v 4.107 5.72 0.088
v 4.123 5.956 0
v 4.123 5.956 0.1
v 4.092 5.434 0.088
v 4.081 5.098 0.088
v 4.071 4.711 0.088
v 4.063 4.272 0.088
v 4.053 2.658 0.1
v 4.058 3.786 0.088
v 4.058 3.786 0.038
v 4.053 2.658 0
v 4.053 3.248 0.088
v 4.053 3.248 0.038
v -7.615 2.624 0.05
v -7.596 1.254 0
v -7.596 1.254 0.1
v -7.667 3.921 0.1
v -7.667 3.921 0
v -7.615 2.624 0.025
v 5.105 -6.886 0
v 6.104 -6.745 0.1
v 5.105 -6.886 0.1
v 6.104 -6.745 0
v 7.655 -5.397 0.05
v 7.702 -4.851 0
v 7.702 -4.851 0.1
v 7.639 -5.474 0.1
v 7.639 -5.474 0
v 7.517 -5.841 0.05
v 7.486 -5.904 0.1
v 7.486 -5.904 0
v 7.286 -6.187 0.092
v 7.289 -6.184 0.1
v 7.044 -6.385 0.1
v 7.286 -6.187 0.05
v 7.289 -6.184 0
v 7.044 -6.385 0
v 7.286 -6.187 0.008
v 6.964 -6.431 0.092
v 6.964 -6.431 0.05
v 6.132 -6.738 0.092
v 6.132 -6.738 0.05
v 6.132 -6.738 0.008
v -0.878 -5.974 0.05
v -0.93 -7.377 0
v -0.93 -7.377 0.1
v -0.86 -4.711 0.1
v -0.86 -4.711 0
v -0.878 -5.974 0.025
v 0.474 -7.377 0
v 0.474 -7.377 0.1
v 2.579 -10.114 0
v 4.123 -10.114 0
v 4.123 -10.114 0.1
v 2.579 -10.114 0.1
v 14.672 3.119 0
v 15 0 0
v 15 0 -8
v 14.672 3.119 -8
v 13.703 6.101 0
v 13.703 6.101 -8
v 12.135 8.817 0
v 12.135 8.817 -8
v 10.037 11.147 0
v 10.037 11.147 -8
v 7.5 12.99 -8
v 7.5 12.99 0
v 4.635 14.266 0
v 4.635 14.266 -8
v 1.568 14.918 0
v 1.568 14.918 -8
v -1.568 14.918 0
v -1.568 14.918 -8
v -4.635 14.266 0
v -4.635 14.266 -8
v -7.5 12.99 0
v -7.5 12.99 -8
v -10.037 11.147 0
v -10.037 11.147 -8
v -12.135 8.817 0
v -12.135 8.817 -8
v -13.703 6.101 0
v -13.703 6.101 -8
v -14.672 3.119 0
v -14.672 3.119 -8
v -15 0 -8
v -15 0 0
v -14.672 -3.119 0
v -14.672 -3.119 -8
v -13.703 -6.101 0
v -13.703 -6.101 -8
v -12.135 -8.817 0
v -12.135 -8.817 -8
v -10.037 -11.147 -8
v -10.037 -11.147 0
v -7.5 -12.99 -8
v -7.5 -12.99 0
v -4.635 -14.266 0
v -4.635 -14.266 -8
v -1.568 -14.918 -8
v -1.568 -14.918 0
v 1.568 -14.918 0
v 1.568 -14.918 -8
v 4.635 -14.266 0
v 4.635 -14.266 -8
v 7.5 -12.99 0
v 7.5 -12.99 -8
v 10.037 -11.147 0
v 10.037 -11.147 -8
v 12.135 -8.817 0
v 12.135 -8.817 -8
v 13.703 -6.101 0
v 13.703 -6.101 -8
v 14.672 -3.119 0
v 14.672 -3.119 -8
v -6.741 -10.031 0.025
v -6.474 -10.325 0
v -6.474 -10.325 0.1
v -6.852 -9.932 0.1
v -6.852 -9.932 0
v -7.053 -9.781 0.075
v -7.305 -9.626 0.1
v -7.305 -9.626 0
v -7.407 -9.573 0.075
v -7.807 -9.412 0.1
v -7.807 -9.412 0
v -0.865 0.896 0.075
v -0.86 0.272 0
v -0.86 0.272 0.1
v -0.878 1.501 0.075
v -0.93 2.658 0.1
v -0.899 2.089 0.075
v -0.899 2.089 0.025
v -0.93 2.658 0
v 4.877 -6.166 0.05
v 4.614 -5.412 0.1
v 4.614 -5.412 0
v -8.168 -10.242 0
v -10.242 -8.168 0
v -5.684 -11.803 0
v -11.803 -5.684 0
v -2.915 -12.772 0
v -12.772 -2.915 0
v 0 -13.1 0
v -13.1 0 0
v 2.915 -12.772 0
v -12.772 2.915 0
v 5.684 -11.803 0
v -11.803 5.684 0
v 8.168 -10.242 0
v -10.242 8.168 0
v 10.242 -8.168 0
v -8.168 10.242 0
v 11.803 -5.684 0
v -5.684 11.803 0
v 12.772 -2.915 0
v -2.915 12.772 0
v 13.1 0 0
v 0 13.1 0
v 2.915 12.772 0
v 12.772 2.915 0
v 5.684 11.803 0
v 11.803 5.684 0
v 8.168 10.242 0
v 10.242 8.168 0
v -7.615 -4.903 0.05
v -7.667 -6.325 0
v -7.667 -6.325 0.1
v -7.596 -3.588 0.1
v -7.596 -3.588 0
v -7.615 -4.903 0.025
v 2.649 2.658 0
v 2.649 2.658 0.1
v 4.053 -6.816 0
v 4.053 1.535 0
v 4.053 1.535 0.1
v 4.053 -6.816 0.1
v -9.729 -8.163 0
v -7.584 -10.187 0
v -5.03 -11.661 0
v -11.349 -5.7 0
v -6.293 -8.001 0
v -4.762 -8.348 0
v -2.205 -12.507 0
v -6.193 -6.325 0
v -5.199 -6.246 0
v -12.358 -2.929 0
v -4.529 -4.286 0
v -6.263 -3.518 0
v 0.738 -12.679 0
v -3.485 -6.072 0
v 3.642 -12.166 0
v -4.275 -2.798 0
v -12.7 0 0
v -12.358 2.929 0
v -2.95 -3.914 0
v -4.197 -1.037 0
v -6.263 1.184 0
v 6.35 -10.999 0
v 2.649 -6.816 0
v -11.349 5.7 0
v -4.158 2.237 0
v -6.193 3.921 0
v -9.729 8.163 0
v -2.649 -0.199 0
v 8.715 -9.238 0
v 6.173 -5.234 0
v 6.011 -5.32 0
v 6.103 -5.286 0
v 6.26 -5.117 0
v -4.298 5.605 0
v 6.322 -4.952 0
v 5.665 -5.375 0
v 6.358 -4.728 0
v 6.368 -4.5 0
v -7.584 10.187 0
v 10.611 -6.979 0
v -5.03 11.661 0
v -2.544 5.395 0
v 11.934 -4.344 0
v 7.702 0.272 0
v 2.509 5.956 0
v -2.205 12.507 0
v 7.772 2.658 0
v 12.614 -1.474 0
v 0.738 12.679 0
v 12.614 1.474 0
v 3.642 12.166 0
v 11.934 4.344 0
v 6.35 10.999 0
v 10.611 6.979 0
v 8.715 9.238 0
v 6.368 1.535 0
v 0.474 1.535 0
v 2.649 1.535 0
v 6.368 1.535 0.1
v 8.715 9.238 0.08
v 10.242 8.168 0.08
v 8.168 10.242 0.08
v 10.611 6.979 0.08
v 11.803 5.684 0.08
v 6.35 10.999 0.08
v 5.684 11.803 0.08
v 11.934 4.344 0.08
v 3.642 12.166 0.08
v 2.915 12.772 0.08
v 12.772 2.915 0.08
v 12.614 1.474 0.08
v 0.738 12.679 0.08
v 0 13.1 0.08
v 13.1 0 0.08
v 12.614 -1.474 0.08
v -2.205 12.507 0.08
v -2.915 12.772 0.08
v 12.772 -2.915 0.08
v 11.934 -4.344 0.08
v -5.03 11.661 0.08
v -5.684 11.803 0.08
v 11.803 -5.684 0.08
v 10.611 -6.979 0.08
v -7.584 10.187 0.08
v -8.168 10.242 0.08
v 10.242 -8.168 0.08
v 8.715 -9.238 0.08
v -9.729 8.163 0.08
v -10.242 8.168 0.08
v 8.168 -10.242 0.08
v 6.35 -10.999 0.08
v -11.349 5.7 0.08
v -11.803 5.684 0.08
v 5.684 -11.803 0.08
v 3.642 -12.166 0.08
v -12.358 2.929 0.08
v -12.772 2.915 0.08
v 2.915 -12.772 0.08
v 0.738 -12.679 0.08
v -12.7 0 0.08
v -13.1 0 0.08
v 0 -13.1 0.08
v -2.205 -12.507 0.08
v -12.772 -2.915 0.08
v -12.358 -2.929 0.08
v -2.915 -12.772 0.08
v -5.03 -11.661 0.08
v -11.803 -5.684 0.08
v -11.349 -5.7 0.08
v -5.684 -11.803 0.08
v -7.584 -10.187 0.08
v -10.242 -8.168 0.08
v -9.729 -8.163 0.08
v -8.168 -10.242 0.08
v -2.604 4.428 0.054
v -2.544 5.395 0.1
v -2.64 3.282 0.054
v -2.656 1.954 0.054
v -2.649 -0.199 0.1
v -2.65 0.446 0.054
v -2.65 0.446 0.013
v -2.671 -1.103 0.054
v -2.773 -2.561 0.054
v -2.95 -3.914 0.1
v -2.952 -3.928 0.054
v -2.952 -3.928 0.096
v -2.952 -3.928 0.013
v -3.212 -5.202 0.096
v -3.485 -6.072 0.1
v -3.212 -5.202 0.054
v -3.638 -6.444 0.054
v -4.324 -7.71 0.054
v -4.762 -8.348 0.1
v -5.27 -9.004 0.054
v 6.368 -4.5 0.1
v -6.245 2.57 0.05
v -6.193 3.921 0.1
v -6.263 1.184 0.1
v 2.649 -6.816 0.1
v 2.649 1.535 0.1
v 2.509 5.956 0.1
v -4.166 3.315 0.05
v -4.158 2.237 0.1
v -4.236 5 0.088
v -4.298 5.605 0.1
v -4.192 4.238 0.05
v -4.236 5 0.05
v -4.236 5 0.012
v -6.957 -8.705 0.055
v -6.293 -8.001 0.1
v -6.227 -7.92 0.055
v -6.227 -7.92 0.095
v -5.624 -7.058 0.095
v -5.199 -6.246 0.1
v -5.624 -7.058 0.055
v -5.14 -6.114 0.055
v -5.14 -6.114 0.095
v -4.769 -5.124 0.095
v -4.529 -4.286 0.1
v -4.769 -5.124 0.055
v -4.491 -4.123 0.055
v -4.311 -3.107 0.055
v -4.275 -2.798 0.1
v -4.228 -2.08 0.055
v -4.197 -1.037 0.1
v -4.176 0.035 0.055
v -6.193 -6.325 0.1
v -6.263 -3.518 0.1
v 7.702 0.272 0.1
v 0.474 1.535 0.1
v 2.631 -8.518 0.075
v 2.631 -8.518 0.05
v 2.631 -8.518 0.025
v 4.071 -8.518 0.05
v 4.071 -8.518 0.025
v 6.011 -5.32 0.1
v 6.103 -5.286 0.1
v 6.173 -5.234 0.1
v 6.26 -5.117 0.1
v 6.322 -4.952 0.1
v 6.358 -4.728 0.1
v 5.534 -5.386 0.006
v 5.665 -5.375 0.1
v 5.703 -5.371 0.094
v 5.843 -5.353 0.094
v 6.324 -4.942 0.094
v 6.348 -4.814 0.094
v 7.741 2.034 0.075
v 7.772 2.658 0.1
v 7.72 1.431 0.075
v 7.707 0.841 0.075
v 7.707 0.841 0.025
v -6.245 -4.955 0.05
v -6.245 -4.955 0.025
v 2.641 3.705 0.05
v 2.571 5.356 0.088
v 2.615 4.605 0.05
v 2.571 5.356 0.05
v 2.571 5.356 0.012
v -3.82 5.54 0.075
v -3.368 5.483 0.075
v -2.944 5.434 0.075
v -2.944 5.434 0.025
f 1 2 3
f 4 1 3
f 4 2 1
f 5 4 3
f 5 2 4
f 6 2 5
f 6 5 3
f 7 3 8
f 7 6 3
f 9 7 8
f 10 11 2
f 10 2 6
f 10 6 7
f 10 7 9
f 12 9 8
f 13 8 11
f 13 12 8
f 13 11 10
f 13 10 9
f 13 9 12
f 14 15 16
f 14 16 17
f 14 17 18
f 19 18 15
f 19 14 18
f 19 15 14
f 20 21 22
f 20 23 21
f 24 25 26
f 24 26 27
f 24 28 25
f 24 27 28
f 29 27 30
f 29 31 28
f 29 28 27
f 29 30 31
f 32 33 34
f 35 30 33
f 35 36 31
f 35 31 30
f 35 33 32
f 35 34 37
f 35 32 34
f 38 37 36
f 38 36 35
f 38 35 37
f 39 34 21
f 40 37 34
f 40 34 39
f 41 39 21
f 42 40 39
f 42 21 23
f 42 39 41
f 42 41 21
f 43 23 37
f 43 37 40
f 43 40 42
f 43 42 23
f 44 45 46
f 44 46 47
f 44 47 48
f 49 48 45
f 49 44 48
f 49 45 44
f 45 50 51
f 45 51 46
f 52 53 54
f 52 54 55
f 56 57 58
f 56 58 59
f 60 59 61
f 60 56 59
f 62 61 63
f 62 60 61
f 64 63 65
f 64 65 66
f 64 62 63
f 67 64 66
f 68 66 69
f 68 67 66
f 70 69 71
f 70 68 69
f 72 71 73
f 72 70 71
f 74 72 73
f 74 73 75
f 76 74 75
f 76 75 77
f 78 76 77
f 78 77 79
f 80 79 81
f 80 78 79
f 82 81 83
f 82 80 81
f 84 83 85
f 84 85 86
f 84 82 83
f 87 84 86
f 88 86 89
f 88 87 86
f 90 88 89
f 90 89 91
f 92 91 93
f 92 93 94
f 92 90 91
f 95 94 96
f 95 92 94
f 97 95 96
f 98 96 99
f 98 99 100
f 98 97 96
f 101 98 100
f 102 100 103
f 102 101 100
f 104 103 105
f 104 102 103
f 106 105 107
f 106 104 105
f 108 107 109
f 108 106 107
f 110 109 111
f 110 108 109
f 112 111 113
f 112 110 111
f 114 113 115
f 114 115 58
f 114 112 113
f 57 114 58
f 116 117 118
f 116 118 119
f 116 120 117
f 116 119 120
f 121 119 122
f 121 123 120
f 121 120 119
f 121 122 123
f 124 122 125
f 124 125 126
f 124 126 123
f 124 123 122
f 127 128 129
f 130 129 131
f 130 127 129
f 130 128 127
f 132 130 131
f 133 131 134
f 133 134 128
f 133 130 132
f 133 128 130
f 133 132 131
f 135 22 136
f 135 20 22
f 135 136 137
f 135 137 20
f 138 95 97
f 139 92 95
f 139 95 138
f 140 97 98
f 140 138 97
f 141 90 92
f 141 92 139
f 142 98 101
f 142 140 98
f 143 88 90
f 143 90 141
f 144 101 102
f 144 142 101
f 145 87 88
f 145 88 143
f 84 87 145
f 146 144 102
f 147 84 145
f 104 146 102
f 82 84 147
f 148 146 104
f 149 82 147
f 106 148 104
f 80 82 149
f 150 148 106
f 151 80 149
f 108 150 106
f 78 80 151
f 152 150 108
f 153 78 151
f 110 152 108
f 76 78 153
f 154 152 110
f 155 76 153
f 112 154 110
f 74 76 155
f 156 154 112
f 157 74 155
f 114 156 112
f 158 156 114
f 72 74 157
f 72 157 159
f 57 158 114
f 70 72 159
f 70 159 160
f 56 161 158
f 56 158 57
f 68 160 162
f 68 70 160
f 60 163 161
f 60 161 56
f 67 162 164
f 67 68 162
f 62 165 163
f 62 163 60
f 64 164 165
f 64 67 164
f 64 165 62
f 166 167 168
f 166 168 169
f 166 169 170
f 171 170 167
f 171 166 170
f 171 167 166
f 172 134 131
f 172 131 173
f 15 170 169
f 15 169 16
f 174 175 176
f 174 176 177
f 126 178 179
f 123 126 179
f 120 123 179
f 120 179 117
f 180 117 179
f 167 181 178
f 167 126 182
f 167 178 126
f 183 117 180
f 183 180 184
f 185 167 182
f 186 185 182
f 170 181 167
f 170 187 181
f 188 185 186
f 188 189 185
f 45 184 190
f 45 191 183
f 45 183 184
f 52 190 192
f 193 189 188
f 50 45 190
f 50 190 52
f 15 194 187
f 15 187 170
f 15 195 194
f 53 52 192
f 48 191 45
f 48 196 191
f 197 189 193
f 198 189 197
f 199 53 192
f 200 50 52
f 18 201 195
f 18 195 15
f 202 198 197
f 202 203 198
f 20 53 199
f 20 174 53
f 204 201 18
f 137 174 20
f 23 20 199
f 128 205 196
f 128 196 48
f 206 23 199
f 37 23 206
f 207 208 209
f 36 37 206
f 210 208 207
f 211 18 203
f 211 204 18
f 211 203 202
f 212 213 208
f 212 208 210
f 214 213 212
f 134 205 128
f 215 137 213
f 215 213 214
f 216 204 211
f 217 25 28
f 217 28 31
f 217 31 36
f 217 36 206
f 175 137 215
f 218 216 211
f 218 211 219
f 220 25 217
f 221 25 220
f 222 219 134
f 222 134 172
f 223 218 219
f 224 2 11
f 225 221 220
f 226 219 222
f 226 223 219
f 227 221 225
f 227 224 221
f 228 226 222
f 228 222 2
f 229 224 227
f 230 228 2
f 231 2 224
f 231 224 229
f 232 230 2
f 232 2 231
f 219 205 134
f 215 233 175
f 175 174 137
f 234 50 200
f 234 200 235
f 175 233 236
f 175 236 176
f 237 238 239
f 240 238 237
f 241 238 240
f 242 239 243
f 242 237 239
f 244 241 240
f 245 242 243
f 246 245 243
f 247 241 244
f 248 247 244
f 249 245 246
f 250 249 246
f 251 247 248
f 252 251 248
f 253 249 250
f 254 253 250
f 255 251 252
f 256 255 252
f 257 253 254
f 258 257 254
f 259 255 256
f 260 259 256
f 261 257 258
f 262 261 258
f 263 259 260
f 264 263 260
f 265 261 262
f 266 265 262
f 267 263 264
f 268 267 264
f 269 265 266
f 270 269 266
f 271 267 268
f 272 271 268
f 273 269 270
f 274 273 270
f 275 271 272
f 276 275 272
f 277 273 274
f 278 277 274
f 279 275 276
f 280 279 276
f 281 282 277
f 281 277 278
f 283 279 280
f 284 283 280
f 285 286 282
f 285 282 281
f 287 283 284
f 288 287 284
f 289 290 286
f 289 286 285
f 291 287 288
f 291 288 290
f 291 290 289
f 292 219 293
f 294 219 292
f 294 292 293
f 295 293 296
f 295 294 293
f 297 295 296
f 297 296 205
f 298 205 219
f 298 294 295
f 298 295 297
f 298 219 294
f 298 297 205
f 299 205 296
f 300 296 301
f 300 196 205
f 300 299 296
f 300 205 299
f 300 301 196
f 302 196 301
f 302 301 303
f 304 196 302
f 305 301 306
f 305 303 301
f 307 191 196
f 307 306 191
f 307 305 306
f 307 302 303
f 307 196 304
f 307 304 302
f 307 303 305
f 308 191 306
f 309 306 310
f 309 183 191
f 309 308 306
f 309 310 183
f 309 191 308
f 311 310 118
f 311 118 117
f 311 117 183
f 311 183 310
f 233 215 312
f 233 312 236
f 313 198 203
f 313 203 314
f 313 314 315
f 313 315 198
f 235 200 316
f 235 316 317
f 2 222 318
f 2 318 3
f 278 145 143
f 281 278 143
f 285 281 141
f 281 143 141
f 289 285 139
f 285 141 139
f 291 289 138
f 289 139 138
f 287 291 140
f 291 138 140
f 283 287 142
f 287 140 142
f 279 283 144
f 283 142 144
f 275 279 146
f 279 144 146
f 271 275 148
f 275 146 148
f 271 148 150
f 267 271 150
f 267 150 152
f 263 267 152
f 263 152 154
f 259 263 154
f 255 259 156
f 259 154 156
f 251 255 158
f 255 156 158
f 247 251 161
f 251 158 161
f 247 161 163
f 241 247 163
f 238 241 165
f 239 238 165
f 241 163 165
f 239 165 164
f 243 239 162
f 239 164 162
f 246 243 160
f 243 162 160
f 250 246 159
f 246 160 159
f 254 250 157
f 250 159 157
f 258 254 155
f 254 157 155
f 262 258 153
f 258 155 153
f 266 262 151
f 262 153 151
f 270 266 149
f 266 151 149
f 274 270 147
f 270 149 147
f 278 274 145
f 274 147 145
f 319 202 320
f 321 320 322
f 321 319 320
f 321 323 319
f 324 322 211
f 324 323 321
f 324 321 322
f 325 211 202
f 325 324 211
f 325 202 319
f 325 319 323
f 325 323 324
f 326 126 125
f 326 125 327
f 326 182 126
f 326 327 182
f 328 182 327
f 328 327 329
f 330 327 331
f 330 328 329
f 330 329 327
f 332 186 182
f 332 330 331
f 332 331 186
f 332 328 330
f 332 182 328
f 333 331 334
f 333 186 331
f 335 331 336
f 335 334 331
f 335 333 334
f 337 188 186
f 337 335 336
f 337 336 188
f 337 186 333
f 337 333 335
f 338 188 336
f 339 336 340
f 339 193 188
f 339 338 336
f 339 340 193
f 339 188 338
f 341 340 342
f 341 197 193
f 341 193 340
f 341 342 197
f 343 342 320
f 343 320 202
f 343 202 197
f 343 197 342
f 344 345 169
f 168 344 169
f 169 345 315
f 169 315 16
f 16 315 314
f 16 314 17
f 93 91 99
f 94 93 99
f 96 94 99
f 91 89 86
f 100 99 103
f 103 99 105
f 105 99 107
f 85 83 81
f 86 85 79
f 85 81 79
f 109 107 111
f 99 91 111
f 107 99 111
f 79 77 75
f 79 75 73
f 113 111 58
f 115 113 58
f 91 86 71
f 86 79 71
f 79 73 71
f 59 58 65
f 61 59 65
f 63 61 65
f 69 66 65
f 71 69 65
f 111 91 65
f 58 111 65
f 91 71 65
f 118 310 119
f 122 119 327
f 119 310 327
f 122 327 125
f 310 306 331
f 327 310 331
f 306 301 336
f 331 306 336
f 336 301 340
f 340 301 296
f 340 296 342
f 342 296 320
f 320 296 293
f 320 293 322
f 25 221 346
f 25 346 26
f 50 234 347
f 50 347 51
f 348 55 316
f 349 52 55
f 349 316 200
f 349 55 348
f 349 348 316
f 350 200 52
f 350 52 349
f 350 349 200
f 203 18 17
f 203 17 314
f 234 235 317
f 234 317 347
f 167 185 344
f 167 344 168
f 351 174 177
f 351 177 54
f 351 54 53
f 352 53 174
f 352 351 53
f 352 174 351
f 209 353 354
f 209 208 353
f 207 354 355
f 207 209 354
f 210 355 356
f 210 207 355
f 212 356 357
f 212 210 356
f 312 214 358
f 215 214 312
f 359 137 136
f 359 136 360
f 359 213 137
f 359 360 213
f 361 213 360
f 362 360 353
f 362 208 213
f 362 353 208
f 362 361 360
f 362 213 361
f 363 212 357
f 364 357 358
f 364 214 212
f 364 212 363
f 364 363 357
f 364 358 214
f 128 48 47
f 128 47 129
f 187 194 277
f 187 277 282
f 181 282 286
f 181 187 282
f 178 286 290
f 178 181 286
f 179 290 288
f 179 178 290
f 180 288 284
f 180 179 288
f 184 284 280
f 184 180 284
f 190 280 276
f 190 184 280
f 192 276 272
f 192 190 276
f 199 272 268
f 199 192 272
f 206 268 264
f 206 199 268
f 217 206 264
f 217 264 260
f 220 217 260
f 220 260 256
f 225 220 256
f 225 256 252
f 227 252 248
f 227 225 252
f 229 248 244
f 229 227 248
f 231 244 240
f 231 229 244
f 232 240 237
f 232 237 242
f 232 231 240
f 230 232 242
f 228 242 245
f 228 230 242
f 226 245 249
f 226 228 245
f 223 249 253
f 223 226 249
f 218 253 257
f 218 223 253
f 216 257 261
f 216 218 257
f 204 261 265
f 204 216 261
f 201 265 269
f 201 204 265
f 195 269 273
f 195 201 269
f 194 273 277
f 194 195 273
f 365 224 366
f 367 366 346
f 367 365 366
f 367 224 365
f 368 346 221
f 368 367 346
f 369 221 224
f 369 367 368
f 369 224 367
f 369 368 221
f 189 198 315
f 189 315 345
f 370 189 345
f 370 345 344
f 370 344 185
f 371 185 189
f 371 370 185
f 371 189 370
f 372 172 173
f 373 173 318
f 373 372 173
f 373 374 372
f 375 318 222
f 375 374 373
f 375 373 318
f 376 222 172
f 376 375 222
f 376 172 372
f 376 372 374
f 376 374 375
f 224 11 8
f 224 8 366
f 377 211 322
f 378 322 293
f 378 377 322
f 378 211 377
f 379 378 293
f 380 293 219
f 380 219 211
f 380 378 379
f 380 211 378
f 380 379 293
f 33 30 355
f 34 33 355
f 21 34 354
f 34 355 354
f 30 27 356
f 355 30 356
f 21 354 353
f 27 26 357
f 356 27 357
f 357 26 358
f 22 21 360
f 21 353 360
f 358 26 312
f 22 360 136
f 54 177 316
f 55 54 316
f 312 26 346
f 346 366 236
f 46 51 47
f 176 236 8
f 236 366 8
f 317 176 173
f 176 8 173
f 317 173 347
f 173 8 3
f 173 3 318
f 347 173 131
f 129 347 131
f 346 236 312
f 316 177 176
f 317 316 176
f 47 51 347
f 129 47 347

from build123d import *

# Parameters (mm, degrees)
SKETCH_1_R               = 15
DIAMETER30_HEIGHT8_DEPTH = 8
CHARACTER_DEPTH          = 0.1
SKETCH_3_R               = 13.1
SKETCH_3_R_2             = 12.7
INK_RING_DEPTH           = 0.08


with BuildPart() as part:
    # 草图1 → Diameter30_Height8 (new body)
    with BuildSketch(Plane.XY):
        Circle(SKETCH_1_R)
    extrude(amount=-DIAMETER30_HEIGHT8_DEPTH)

    # 草图2 → Character_帅 (add)
    with BuildSketch(Plane.XY):
        with BuildLine():
            add(Edge.make_bspline(
                [(2.649122807, 2.657894737), (2.648277509, 2.838961546), (2.646647548, 3.188106947), (2.643949337, 3.693304246), (2.627710858, 4.161013978), (2.618261471, 4.592706352), (2.59561766, 4.986803608), (2.573364544, 5.343905172), (2.545932395, 5.6629896), (2.520624442, 5.862638482), (2.50877193, 5.956140351)],
                knots=[0, 0, 0, 0, 1.315583411, 2.536797873, 3.670260287, 4.715635349, 5.673736592, 6.537953599, 7.315277556, 8, 8, 8, 8], degree=3))
            Line((2.50877193, 5.956140351), (4.122807018, 5.956140351))
            add(Edge.make_bspline(
                [(4.122807018, 5.956140351), (4.117499898, 5.877309705), (4.105781963, 5.703254378), (4.089167905, 5.417436401), (4.081123846, 5.081109437), (4.069497803, 4.693902375), (4.062208699, 4.256354693), (4.058010495, 3.768573009), (4.051072159, 3.230576781), (4.052096052, 2.854561793), (4.052631579, 2.657894737)],
                knots=[0, 0, 0, 0, 0.574688494, 1.268892212, 2.082186167, 3.021459211, 4.086593269, 5.265055303, 6.569542337, 8, 8, 8, 8], degree=3))
            Line((4.052631579, 2.657894737), (7.771929825, 2.657894737))
            add(Edge.make_bspline(
                [(7.771929825, 2.657894737), (7.760796072, 2.449999982), (7.73890673, 2.041271737), (7.719157498, 1.435549924), (7.705407242, 0.848123825), (7.702957274, 0.461670931), (7.701754386, 0.271929825)],
                knots=[0, 0, 0, 0, 1.046485867, 2.057427233, 3.046233291, 4, 4, 4, 4], degree=3))
            Line((7.701754386, 0.271929825), (7.701754386, -4.850877193))
            add(Edge.make_bspline(
                [(7.701754386, -4.850877193), (7.700509851, -4.946341409), (7.69812364, -5.129379766), (7.659319509, -5.390999722), (7.605347303, -5.628411903), (7.522536164, -5.840237206), (7.420768732, -6.029019154), (7.289859981, -6.189160821), (7.140756422, -6.328733562), (6.901013102, -6.472408104), (6.563626246, -6.612761018), (6.121927666, -6.749793211), (5.6299881, -6.842128832), (5.284963987, -6.870952514), (5.105263158, -6.885964912)],
                knots=[0, 0, 0, 0, 0.91195479, 1.748536932, 2.524193789, 3.235017793, 3.917413987, 4.565660724, 5.204897301, 5.860042995, 7.225363373, 8.690313679, 10.276197647, 12, 12, 12, 12], degree=3))
            add(Edge.make_bspline(
                [(5.105263158, -6.885964912), (5.030622329, -6.645449861), (4.877118075, -6.150813287), (4.703323003, -5.662931781), (4.614035088, -5.412280702)],
                knots=[0, 0, 0, 0, 0.972491982, 2, 2, 2, 2], degree=3))
            add(Edge.make_bspline(
                [(4.614035088, -5.412280702), (4.703272413, -5.411616614), (4.873964221, -5.410346357), (5.116579774, -5.405384501), (5.334043291, -5.397378419), (5.526579613, -5.38822529), (5.693812444, -5.372515338), (5.836088174, -5.354724862), (5.952359909, -5.334162259), (6.04894766, -5.312443399), (6.128856661, -5.275644675), (6.193160306, -5.21721386), (6.247720931, -5.142694696), (6.295806352, -5.050517957), (6.327140956, -4.938045189), (6.350107, -4.808315534), (6.366009975, -4.660655055), (6.367588242, -4.555491891), (6.368421053, -4.5)],
                knots=[0, 0, 0, 0, 1.810479571, 3.463057961, 4.922871987, 6.225442376, 7.372781237, 8.329861336, 9.133212, 9.768407665, 10.334419243, 10.894946083, 11.510128595, 12.201898471, 12.991479159, 13.867141808, 14.874545699, 16, 16, 16, 16], degree=3))
            Line((6.368421053, -4.5), (6.368421053, 1.535087719))
            Line((6.368421053, 1.535087719), (4.052631579, 1.535087719))
            Line((4.052631579, 1.535087719), (4.052631579, -6.815789474))
            add(Edge.make_bspline(
                [(4.052631579, -6.815789474), (4.053765197, -7.103428128), (4.056001813, -7.670936452), (4.069634056, -8.508736417), (4.088763125, -9.320656714), (4.11158118, -9.852421744), (4.122807018, -10.114035088)],
                knots=[0, 0, 0, 0, 1.046194404, 2.064131589, 3.047607535, 4, 4, 4, 4], degree=3))
            Line((4.122807018, -10.114035088), (2.578947368, -10.114035088))
            add(Edge.make_bspline(
                [(2.578947368, -10.114035088), (2.590173206, -9.852421744), (2.612991261, -9.320656714), (2.63212033, -8.508736417), (2.645752573, -7.670936452), (2.647989189, -7.103428128), (2.649122807, -6.815789474)],
                knots=[0, 0, 0, 0, 0.952392465, 1.935868411, 2.953805596, 4, 4, 4, 4], degree=3))
            Line((2.649122807, -6.815789474), (2.649122807, 1.535087719))
            Line((2.649122807, 1.535087719), (0.473684211, 1.535087719))
            Line((0.473684211, 1.535087719), (0.473684211, -7.377192982))
            Line((0.473684211, -7.377192982), (-0.929824561, -7.377192982))
            add(Edge.make_bspline(
                [(-0.929824561, -7.377192982), (-0.918712527, -7.137237676), (-0.89705509, -6.669562974), (-0.877305751, -5.985025613), (-0.863382791, -5.336096743), (-0.860869477, -4.914994784), (-0.859649123, -4.710526316)],
                knots=[0, 0, 0, 0, 1.08047164, 2.105847367, 3.080283338, 4, 4, 4, 4], degree=3))
            Line((-0.859649123, -4.710526316), (-0.859649123, 0.271929825))
            add(Edge.make_bspline(
                [(-0.859649123, 0.271929825), (-0.860778179, 0.479865427), (-0.863003576, 0.889711309), (-0.876691761, 1.495334741), (-0.895801581, 2.082918827), (-0.918599793, 2.468200268), (-0.929824561, 2.657894737)],
                knots=[0, 0, 0, 0, 1.045182189, 2.060078265, 3.044873733, 4, 4, 4, 4], degree=3))
            Line((-0.929824561, 2.657894737), (2.649122807, 2.657894737))
        make_face()
        with BuildLine():
            add(Edge.make_bspline(
                [(-2.543859649, 5.394736842), (-2.55453691, 5.241410089), (-2.576968973, 4.919282974), (-2.606332671, 4.4133937), (-2.625722602, 3.862230343), (-2.641455489, 3.266150249), (-2.651530629, 2.625004365), (-2.656494342, 1.938824334), (-2.656719765, 1.207587715), (-2.649857053, 0.442624259), (-2.646120363, -0.33291913), (-2.667300728, -1.096525685), (-2.709346485, -1.836581392), (-2.767619156, -2.554468791), (-2.849443973, -3.249377344), (-2.946107025, -3.921647543), (-3.067303461, -4.570685232), (-3.204881304, -5.204412609), (-3.386965023, -5.831459902), (-3.6329141, -6.458227284), (-3.948908402, -7.087582997), (-4.324035754, -7.726937374), (-4.768016313, -8.370052347), (-5.274742334, -9.020901708), (-5.843502049, -9.679758443), (-6.259926358, -10.105844174), (-6.473684211, -10.324561404)],
                knots=[0, 0, 0, 0, 0.659190093, 1.384905098, 2.173195898, 3.024385089, 3.942285353, 4.923260466, 5.96737447, 7.078396075, 8.204255659, 9.293363896, 10.354008229, 11.383098418, 12.381857005, 13.354528352, 14.295395268, 15.213084928, 16.134880166, 17.092610712, 18.096292209, 19.152239996, 20.269451564, 21.445260402, 22.688607657, 24, 24, 24, 24], degree=3))
            add(Edge.make_bspline(
                [(-6.473684211, -10.324561404), (-6.559732909, -10.223409926), (-6.732267206, -10.020593389), (-7.051816717, -9.772809488), (-7.40742211, -9.558009314), (-7.671581713, -9.461672847), (-7.807017544, -9.412280702)],
                knots=[0, 0, 0, 0, 0.970214787, 1.94535571, 2.94657452, 4, 4, 4, 4], degree=3))
            add(Edge.make_bspline(
                [(-7.807017544, -9.412280702), (-7.657973182, -9.300088741), (-7.363260789, -9.078246324), (-6.955815499, -8.710596291), (-6.57424992, -8.328429932), (-6.223348035, -7.926246582), (-5.904578485, -7.503232626), (-5.618396742, -7.059527971), (-5.360624691, -6.597131501), (-5.135263603, -6.115997615), (-4.940375439, -5.623171603), (-4.765347571, -5.126552857), (-4.614790167, -4.626941063), (-4.485965447, -4.124417421), (-4.385577394, -3.617432725), (-4.307679883, -3.107532014), (-4.251338798, -2.595099135), (-4.218416323, -1.902922648), (-4.195596224, -1.026008016), (-4.174639454, 0.042281327), (-4.161380369, 1.13219518), (-4.159064793, 1.86603464), (-4.157894737, 2.236842105)],
                knots=[0, 0, 0, 0, 0.876110196, 1.73237371, 2.575729557, 3.4124282, 4.237942316, 5.062170833, 5.891260029, 6.723431221, 7.556418375, 8.38034529, 9.196777122, 10.007322445, 10.81680406, 11.623928264, 12.430374722, 13.237591303, 14.878759917, 16.552082939, 18.25777509, 20, 20, 20, 20], degree=3))
            add(Edge.make_bspline(
                [(-4.157894737, 2.236842105), (-4.158742697, 2.42310712), (-4.160379489, 2.782648704), (-4.163043616, 3.302572137), (-4.179306434, 3.783279411), (-4.188638552, 4.224503155), (-4.21144322, 4.62552561), (-4.233545861, 4.986968321), (-4.261113513, 5.309505904), (-4.286397635, 5.510893979), (-4.298245614, 5.605263158)],
                knots=[0, 0, 0, 0, 1.325220203, 2.558031484, 3.6987413, 4.747031617, 5.69752876, 6.556083798, 7.323389997, 8, 8, 8, 8], degree=3))
            add(Edge.make_bspline(
                [(-4.298245614, 5.605263158), (-4.138880204, 5.583255195), (-3.828993721, 5.54046065), (-3.377518369, 5.48397261), (-2.952393963, 5.432706182), (-2.677341911, 5.407142736), (-2.543859649, 5.394736842)],
                knots=[0, 0, 0, 0, 1.092444961, 2.124262261, 3.089707881, 4, 4, 4, 4], degree=3))
        make_face()
        with BuildLine():
            add(Edge.make_bspline(
                [(-6.192982456, 3.921052632), (-6.213127144, 3.470616313), (-6.25390666, 2.558784097), (-6.260049539, 1.646058489), (-6.263157895, 1.184210526)],
                knots=[0, 0, 0, 0, 0.987980705, 2, 2, 2, 2], degree=3))
            Line((-6.263157895, 1.184210526), (-6.263157895, -3.51754386))
            add(Edge.make_bspline(
                [(-6.263157895, -3.51754386), (-6.262026133, -3.760132755), (-6.259790748, -4.239279455), (-6.246045202, -4.949726115), (-6.226937452, -5.6429749), (-6.204202458, -6.099339702), (-6.192982456, -6.324561404)],
                knots=[0, 0, 0, 0, 1.036632017, 2.04749195, 3.036413013, 4, 4, 4, 4], degree=3))
            Line((-6.192982456, -6.324561404), (-7.666666667, -6.324561404))
            add(Edge.make_bspline(
                [(-7.666666667, -6.324561404), (-7.655523902, -6.083740603), (-7.633604379, -5.610009217), (-7.61410139, -4.912465947), (-7.600135574, -4.241012646), (-7.597689835, -3.802584211), (-7.596491228, -3.587719298)],
                knots=[0, 0, 0, 0, 1.05657797, 2.078450635, 3.058287504, 4, 4, 4, 4], degree=3))
            Line((-7.596491228, -3.587719298), (-7.596491228, 1.254385965))
            add(Edge.make_bspline(
                [(-7.596491228, 1.254385965), (-7.597623519, 1.485712467), (-7.599858589, 1.94233606), (-7.613556549, 2.618130935), (-7.632693155, 3.27586782), (-7.655445944, 3.707961922), (-7.666666667, 3.921052632)],
                knots=[0, 0, 0, 0, 1.040483654, 2.053847617, 3.040239174, 4, 4, 4, 4], degree=3))
            Line((-7.666666667, 3.921052632), (-6.192982456, 3.921052632))
        make_face()
    extrude(amount=CHARACTER_DEPTH)

    # 草图3 → Ink_ring (add)
    with BuildSketch(Plane.XY):
        with Locations(Location((0, 0, 0), (0, 0, 180))):
            Circle(SKETCH_3_R)
        with Locations(Location((0, 0, 0), (0, 0, 180))):
            Circle(SKETCH_3_R_2, mode=Mode.SUBTRACT)
    extrude(amount=INK_RING_DEPTH)


solid = part.part
